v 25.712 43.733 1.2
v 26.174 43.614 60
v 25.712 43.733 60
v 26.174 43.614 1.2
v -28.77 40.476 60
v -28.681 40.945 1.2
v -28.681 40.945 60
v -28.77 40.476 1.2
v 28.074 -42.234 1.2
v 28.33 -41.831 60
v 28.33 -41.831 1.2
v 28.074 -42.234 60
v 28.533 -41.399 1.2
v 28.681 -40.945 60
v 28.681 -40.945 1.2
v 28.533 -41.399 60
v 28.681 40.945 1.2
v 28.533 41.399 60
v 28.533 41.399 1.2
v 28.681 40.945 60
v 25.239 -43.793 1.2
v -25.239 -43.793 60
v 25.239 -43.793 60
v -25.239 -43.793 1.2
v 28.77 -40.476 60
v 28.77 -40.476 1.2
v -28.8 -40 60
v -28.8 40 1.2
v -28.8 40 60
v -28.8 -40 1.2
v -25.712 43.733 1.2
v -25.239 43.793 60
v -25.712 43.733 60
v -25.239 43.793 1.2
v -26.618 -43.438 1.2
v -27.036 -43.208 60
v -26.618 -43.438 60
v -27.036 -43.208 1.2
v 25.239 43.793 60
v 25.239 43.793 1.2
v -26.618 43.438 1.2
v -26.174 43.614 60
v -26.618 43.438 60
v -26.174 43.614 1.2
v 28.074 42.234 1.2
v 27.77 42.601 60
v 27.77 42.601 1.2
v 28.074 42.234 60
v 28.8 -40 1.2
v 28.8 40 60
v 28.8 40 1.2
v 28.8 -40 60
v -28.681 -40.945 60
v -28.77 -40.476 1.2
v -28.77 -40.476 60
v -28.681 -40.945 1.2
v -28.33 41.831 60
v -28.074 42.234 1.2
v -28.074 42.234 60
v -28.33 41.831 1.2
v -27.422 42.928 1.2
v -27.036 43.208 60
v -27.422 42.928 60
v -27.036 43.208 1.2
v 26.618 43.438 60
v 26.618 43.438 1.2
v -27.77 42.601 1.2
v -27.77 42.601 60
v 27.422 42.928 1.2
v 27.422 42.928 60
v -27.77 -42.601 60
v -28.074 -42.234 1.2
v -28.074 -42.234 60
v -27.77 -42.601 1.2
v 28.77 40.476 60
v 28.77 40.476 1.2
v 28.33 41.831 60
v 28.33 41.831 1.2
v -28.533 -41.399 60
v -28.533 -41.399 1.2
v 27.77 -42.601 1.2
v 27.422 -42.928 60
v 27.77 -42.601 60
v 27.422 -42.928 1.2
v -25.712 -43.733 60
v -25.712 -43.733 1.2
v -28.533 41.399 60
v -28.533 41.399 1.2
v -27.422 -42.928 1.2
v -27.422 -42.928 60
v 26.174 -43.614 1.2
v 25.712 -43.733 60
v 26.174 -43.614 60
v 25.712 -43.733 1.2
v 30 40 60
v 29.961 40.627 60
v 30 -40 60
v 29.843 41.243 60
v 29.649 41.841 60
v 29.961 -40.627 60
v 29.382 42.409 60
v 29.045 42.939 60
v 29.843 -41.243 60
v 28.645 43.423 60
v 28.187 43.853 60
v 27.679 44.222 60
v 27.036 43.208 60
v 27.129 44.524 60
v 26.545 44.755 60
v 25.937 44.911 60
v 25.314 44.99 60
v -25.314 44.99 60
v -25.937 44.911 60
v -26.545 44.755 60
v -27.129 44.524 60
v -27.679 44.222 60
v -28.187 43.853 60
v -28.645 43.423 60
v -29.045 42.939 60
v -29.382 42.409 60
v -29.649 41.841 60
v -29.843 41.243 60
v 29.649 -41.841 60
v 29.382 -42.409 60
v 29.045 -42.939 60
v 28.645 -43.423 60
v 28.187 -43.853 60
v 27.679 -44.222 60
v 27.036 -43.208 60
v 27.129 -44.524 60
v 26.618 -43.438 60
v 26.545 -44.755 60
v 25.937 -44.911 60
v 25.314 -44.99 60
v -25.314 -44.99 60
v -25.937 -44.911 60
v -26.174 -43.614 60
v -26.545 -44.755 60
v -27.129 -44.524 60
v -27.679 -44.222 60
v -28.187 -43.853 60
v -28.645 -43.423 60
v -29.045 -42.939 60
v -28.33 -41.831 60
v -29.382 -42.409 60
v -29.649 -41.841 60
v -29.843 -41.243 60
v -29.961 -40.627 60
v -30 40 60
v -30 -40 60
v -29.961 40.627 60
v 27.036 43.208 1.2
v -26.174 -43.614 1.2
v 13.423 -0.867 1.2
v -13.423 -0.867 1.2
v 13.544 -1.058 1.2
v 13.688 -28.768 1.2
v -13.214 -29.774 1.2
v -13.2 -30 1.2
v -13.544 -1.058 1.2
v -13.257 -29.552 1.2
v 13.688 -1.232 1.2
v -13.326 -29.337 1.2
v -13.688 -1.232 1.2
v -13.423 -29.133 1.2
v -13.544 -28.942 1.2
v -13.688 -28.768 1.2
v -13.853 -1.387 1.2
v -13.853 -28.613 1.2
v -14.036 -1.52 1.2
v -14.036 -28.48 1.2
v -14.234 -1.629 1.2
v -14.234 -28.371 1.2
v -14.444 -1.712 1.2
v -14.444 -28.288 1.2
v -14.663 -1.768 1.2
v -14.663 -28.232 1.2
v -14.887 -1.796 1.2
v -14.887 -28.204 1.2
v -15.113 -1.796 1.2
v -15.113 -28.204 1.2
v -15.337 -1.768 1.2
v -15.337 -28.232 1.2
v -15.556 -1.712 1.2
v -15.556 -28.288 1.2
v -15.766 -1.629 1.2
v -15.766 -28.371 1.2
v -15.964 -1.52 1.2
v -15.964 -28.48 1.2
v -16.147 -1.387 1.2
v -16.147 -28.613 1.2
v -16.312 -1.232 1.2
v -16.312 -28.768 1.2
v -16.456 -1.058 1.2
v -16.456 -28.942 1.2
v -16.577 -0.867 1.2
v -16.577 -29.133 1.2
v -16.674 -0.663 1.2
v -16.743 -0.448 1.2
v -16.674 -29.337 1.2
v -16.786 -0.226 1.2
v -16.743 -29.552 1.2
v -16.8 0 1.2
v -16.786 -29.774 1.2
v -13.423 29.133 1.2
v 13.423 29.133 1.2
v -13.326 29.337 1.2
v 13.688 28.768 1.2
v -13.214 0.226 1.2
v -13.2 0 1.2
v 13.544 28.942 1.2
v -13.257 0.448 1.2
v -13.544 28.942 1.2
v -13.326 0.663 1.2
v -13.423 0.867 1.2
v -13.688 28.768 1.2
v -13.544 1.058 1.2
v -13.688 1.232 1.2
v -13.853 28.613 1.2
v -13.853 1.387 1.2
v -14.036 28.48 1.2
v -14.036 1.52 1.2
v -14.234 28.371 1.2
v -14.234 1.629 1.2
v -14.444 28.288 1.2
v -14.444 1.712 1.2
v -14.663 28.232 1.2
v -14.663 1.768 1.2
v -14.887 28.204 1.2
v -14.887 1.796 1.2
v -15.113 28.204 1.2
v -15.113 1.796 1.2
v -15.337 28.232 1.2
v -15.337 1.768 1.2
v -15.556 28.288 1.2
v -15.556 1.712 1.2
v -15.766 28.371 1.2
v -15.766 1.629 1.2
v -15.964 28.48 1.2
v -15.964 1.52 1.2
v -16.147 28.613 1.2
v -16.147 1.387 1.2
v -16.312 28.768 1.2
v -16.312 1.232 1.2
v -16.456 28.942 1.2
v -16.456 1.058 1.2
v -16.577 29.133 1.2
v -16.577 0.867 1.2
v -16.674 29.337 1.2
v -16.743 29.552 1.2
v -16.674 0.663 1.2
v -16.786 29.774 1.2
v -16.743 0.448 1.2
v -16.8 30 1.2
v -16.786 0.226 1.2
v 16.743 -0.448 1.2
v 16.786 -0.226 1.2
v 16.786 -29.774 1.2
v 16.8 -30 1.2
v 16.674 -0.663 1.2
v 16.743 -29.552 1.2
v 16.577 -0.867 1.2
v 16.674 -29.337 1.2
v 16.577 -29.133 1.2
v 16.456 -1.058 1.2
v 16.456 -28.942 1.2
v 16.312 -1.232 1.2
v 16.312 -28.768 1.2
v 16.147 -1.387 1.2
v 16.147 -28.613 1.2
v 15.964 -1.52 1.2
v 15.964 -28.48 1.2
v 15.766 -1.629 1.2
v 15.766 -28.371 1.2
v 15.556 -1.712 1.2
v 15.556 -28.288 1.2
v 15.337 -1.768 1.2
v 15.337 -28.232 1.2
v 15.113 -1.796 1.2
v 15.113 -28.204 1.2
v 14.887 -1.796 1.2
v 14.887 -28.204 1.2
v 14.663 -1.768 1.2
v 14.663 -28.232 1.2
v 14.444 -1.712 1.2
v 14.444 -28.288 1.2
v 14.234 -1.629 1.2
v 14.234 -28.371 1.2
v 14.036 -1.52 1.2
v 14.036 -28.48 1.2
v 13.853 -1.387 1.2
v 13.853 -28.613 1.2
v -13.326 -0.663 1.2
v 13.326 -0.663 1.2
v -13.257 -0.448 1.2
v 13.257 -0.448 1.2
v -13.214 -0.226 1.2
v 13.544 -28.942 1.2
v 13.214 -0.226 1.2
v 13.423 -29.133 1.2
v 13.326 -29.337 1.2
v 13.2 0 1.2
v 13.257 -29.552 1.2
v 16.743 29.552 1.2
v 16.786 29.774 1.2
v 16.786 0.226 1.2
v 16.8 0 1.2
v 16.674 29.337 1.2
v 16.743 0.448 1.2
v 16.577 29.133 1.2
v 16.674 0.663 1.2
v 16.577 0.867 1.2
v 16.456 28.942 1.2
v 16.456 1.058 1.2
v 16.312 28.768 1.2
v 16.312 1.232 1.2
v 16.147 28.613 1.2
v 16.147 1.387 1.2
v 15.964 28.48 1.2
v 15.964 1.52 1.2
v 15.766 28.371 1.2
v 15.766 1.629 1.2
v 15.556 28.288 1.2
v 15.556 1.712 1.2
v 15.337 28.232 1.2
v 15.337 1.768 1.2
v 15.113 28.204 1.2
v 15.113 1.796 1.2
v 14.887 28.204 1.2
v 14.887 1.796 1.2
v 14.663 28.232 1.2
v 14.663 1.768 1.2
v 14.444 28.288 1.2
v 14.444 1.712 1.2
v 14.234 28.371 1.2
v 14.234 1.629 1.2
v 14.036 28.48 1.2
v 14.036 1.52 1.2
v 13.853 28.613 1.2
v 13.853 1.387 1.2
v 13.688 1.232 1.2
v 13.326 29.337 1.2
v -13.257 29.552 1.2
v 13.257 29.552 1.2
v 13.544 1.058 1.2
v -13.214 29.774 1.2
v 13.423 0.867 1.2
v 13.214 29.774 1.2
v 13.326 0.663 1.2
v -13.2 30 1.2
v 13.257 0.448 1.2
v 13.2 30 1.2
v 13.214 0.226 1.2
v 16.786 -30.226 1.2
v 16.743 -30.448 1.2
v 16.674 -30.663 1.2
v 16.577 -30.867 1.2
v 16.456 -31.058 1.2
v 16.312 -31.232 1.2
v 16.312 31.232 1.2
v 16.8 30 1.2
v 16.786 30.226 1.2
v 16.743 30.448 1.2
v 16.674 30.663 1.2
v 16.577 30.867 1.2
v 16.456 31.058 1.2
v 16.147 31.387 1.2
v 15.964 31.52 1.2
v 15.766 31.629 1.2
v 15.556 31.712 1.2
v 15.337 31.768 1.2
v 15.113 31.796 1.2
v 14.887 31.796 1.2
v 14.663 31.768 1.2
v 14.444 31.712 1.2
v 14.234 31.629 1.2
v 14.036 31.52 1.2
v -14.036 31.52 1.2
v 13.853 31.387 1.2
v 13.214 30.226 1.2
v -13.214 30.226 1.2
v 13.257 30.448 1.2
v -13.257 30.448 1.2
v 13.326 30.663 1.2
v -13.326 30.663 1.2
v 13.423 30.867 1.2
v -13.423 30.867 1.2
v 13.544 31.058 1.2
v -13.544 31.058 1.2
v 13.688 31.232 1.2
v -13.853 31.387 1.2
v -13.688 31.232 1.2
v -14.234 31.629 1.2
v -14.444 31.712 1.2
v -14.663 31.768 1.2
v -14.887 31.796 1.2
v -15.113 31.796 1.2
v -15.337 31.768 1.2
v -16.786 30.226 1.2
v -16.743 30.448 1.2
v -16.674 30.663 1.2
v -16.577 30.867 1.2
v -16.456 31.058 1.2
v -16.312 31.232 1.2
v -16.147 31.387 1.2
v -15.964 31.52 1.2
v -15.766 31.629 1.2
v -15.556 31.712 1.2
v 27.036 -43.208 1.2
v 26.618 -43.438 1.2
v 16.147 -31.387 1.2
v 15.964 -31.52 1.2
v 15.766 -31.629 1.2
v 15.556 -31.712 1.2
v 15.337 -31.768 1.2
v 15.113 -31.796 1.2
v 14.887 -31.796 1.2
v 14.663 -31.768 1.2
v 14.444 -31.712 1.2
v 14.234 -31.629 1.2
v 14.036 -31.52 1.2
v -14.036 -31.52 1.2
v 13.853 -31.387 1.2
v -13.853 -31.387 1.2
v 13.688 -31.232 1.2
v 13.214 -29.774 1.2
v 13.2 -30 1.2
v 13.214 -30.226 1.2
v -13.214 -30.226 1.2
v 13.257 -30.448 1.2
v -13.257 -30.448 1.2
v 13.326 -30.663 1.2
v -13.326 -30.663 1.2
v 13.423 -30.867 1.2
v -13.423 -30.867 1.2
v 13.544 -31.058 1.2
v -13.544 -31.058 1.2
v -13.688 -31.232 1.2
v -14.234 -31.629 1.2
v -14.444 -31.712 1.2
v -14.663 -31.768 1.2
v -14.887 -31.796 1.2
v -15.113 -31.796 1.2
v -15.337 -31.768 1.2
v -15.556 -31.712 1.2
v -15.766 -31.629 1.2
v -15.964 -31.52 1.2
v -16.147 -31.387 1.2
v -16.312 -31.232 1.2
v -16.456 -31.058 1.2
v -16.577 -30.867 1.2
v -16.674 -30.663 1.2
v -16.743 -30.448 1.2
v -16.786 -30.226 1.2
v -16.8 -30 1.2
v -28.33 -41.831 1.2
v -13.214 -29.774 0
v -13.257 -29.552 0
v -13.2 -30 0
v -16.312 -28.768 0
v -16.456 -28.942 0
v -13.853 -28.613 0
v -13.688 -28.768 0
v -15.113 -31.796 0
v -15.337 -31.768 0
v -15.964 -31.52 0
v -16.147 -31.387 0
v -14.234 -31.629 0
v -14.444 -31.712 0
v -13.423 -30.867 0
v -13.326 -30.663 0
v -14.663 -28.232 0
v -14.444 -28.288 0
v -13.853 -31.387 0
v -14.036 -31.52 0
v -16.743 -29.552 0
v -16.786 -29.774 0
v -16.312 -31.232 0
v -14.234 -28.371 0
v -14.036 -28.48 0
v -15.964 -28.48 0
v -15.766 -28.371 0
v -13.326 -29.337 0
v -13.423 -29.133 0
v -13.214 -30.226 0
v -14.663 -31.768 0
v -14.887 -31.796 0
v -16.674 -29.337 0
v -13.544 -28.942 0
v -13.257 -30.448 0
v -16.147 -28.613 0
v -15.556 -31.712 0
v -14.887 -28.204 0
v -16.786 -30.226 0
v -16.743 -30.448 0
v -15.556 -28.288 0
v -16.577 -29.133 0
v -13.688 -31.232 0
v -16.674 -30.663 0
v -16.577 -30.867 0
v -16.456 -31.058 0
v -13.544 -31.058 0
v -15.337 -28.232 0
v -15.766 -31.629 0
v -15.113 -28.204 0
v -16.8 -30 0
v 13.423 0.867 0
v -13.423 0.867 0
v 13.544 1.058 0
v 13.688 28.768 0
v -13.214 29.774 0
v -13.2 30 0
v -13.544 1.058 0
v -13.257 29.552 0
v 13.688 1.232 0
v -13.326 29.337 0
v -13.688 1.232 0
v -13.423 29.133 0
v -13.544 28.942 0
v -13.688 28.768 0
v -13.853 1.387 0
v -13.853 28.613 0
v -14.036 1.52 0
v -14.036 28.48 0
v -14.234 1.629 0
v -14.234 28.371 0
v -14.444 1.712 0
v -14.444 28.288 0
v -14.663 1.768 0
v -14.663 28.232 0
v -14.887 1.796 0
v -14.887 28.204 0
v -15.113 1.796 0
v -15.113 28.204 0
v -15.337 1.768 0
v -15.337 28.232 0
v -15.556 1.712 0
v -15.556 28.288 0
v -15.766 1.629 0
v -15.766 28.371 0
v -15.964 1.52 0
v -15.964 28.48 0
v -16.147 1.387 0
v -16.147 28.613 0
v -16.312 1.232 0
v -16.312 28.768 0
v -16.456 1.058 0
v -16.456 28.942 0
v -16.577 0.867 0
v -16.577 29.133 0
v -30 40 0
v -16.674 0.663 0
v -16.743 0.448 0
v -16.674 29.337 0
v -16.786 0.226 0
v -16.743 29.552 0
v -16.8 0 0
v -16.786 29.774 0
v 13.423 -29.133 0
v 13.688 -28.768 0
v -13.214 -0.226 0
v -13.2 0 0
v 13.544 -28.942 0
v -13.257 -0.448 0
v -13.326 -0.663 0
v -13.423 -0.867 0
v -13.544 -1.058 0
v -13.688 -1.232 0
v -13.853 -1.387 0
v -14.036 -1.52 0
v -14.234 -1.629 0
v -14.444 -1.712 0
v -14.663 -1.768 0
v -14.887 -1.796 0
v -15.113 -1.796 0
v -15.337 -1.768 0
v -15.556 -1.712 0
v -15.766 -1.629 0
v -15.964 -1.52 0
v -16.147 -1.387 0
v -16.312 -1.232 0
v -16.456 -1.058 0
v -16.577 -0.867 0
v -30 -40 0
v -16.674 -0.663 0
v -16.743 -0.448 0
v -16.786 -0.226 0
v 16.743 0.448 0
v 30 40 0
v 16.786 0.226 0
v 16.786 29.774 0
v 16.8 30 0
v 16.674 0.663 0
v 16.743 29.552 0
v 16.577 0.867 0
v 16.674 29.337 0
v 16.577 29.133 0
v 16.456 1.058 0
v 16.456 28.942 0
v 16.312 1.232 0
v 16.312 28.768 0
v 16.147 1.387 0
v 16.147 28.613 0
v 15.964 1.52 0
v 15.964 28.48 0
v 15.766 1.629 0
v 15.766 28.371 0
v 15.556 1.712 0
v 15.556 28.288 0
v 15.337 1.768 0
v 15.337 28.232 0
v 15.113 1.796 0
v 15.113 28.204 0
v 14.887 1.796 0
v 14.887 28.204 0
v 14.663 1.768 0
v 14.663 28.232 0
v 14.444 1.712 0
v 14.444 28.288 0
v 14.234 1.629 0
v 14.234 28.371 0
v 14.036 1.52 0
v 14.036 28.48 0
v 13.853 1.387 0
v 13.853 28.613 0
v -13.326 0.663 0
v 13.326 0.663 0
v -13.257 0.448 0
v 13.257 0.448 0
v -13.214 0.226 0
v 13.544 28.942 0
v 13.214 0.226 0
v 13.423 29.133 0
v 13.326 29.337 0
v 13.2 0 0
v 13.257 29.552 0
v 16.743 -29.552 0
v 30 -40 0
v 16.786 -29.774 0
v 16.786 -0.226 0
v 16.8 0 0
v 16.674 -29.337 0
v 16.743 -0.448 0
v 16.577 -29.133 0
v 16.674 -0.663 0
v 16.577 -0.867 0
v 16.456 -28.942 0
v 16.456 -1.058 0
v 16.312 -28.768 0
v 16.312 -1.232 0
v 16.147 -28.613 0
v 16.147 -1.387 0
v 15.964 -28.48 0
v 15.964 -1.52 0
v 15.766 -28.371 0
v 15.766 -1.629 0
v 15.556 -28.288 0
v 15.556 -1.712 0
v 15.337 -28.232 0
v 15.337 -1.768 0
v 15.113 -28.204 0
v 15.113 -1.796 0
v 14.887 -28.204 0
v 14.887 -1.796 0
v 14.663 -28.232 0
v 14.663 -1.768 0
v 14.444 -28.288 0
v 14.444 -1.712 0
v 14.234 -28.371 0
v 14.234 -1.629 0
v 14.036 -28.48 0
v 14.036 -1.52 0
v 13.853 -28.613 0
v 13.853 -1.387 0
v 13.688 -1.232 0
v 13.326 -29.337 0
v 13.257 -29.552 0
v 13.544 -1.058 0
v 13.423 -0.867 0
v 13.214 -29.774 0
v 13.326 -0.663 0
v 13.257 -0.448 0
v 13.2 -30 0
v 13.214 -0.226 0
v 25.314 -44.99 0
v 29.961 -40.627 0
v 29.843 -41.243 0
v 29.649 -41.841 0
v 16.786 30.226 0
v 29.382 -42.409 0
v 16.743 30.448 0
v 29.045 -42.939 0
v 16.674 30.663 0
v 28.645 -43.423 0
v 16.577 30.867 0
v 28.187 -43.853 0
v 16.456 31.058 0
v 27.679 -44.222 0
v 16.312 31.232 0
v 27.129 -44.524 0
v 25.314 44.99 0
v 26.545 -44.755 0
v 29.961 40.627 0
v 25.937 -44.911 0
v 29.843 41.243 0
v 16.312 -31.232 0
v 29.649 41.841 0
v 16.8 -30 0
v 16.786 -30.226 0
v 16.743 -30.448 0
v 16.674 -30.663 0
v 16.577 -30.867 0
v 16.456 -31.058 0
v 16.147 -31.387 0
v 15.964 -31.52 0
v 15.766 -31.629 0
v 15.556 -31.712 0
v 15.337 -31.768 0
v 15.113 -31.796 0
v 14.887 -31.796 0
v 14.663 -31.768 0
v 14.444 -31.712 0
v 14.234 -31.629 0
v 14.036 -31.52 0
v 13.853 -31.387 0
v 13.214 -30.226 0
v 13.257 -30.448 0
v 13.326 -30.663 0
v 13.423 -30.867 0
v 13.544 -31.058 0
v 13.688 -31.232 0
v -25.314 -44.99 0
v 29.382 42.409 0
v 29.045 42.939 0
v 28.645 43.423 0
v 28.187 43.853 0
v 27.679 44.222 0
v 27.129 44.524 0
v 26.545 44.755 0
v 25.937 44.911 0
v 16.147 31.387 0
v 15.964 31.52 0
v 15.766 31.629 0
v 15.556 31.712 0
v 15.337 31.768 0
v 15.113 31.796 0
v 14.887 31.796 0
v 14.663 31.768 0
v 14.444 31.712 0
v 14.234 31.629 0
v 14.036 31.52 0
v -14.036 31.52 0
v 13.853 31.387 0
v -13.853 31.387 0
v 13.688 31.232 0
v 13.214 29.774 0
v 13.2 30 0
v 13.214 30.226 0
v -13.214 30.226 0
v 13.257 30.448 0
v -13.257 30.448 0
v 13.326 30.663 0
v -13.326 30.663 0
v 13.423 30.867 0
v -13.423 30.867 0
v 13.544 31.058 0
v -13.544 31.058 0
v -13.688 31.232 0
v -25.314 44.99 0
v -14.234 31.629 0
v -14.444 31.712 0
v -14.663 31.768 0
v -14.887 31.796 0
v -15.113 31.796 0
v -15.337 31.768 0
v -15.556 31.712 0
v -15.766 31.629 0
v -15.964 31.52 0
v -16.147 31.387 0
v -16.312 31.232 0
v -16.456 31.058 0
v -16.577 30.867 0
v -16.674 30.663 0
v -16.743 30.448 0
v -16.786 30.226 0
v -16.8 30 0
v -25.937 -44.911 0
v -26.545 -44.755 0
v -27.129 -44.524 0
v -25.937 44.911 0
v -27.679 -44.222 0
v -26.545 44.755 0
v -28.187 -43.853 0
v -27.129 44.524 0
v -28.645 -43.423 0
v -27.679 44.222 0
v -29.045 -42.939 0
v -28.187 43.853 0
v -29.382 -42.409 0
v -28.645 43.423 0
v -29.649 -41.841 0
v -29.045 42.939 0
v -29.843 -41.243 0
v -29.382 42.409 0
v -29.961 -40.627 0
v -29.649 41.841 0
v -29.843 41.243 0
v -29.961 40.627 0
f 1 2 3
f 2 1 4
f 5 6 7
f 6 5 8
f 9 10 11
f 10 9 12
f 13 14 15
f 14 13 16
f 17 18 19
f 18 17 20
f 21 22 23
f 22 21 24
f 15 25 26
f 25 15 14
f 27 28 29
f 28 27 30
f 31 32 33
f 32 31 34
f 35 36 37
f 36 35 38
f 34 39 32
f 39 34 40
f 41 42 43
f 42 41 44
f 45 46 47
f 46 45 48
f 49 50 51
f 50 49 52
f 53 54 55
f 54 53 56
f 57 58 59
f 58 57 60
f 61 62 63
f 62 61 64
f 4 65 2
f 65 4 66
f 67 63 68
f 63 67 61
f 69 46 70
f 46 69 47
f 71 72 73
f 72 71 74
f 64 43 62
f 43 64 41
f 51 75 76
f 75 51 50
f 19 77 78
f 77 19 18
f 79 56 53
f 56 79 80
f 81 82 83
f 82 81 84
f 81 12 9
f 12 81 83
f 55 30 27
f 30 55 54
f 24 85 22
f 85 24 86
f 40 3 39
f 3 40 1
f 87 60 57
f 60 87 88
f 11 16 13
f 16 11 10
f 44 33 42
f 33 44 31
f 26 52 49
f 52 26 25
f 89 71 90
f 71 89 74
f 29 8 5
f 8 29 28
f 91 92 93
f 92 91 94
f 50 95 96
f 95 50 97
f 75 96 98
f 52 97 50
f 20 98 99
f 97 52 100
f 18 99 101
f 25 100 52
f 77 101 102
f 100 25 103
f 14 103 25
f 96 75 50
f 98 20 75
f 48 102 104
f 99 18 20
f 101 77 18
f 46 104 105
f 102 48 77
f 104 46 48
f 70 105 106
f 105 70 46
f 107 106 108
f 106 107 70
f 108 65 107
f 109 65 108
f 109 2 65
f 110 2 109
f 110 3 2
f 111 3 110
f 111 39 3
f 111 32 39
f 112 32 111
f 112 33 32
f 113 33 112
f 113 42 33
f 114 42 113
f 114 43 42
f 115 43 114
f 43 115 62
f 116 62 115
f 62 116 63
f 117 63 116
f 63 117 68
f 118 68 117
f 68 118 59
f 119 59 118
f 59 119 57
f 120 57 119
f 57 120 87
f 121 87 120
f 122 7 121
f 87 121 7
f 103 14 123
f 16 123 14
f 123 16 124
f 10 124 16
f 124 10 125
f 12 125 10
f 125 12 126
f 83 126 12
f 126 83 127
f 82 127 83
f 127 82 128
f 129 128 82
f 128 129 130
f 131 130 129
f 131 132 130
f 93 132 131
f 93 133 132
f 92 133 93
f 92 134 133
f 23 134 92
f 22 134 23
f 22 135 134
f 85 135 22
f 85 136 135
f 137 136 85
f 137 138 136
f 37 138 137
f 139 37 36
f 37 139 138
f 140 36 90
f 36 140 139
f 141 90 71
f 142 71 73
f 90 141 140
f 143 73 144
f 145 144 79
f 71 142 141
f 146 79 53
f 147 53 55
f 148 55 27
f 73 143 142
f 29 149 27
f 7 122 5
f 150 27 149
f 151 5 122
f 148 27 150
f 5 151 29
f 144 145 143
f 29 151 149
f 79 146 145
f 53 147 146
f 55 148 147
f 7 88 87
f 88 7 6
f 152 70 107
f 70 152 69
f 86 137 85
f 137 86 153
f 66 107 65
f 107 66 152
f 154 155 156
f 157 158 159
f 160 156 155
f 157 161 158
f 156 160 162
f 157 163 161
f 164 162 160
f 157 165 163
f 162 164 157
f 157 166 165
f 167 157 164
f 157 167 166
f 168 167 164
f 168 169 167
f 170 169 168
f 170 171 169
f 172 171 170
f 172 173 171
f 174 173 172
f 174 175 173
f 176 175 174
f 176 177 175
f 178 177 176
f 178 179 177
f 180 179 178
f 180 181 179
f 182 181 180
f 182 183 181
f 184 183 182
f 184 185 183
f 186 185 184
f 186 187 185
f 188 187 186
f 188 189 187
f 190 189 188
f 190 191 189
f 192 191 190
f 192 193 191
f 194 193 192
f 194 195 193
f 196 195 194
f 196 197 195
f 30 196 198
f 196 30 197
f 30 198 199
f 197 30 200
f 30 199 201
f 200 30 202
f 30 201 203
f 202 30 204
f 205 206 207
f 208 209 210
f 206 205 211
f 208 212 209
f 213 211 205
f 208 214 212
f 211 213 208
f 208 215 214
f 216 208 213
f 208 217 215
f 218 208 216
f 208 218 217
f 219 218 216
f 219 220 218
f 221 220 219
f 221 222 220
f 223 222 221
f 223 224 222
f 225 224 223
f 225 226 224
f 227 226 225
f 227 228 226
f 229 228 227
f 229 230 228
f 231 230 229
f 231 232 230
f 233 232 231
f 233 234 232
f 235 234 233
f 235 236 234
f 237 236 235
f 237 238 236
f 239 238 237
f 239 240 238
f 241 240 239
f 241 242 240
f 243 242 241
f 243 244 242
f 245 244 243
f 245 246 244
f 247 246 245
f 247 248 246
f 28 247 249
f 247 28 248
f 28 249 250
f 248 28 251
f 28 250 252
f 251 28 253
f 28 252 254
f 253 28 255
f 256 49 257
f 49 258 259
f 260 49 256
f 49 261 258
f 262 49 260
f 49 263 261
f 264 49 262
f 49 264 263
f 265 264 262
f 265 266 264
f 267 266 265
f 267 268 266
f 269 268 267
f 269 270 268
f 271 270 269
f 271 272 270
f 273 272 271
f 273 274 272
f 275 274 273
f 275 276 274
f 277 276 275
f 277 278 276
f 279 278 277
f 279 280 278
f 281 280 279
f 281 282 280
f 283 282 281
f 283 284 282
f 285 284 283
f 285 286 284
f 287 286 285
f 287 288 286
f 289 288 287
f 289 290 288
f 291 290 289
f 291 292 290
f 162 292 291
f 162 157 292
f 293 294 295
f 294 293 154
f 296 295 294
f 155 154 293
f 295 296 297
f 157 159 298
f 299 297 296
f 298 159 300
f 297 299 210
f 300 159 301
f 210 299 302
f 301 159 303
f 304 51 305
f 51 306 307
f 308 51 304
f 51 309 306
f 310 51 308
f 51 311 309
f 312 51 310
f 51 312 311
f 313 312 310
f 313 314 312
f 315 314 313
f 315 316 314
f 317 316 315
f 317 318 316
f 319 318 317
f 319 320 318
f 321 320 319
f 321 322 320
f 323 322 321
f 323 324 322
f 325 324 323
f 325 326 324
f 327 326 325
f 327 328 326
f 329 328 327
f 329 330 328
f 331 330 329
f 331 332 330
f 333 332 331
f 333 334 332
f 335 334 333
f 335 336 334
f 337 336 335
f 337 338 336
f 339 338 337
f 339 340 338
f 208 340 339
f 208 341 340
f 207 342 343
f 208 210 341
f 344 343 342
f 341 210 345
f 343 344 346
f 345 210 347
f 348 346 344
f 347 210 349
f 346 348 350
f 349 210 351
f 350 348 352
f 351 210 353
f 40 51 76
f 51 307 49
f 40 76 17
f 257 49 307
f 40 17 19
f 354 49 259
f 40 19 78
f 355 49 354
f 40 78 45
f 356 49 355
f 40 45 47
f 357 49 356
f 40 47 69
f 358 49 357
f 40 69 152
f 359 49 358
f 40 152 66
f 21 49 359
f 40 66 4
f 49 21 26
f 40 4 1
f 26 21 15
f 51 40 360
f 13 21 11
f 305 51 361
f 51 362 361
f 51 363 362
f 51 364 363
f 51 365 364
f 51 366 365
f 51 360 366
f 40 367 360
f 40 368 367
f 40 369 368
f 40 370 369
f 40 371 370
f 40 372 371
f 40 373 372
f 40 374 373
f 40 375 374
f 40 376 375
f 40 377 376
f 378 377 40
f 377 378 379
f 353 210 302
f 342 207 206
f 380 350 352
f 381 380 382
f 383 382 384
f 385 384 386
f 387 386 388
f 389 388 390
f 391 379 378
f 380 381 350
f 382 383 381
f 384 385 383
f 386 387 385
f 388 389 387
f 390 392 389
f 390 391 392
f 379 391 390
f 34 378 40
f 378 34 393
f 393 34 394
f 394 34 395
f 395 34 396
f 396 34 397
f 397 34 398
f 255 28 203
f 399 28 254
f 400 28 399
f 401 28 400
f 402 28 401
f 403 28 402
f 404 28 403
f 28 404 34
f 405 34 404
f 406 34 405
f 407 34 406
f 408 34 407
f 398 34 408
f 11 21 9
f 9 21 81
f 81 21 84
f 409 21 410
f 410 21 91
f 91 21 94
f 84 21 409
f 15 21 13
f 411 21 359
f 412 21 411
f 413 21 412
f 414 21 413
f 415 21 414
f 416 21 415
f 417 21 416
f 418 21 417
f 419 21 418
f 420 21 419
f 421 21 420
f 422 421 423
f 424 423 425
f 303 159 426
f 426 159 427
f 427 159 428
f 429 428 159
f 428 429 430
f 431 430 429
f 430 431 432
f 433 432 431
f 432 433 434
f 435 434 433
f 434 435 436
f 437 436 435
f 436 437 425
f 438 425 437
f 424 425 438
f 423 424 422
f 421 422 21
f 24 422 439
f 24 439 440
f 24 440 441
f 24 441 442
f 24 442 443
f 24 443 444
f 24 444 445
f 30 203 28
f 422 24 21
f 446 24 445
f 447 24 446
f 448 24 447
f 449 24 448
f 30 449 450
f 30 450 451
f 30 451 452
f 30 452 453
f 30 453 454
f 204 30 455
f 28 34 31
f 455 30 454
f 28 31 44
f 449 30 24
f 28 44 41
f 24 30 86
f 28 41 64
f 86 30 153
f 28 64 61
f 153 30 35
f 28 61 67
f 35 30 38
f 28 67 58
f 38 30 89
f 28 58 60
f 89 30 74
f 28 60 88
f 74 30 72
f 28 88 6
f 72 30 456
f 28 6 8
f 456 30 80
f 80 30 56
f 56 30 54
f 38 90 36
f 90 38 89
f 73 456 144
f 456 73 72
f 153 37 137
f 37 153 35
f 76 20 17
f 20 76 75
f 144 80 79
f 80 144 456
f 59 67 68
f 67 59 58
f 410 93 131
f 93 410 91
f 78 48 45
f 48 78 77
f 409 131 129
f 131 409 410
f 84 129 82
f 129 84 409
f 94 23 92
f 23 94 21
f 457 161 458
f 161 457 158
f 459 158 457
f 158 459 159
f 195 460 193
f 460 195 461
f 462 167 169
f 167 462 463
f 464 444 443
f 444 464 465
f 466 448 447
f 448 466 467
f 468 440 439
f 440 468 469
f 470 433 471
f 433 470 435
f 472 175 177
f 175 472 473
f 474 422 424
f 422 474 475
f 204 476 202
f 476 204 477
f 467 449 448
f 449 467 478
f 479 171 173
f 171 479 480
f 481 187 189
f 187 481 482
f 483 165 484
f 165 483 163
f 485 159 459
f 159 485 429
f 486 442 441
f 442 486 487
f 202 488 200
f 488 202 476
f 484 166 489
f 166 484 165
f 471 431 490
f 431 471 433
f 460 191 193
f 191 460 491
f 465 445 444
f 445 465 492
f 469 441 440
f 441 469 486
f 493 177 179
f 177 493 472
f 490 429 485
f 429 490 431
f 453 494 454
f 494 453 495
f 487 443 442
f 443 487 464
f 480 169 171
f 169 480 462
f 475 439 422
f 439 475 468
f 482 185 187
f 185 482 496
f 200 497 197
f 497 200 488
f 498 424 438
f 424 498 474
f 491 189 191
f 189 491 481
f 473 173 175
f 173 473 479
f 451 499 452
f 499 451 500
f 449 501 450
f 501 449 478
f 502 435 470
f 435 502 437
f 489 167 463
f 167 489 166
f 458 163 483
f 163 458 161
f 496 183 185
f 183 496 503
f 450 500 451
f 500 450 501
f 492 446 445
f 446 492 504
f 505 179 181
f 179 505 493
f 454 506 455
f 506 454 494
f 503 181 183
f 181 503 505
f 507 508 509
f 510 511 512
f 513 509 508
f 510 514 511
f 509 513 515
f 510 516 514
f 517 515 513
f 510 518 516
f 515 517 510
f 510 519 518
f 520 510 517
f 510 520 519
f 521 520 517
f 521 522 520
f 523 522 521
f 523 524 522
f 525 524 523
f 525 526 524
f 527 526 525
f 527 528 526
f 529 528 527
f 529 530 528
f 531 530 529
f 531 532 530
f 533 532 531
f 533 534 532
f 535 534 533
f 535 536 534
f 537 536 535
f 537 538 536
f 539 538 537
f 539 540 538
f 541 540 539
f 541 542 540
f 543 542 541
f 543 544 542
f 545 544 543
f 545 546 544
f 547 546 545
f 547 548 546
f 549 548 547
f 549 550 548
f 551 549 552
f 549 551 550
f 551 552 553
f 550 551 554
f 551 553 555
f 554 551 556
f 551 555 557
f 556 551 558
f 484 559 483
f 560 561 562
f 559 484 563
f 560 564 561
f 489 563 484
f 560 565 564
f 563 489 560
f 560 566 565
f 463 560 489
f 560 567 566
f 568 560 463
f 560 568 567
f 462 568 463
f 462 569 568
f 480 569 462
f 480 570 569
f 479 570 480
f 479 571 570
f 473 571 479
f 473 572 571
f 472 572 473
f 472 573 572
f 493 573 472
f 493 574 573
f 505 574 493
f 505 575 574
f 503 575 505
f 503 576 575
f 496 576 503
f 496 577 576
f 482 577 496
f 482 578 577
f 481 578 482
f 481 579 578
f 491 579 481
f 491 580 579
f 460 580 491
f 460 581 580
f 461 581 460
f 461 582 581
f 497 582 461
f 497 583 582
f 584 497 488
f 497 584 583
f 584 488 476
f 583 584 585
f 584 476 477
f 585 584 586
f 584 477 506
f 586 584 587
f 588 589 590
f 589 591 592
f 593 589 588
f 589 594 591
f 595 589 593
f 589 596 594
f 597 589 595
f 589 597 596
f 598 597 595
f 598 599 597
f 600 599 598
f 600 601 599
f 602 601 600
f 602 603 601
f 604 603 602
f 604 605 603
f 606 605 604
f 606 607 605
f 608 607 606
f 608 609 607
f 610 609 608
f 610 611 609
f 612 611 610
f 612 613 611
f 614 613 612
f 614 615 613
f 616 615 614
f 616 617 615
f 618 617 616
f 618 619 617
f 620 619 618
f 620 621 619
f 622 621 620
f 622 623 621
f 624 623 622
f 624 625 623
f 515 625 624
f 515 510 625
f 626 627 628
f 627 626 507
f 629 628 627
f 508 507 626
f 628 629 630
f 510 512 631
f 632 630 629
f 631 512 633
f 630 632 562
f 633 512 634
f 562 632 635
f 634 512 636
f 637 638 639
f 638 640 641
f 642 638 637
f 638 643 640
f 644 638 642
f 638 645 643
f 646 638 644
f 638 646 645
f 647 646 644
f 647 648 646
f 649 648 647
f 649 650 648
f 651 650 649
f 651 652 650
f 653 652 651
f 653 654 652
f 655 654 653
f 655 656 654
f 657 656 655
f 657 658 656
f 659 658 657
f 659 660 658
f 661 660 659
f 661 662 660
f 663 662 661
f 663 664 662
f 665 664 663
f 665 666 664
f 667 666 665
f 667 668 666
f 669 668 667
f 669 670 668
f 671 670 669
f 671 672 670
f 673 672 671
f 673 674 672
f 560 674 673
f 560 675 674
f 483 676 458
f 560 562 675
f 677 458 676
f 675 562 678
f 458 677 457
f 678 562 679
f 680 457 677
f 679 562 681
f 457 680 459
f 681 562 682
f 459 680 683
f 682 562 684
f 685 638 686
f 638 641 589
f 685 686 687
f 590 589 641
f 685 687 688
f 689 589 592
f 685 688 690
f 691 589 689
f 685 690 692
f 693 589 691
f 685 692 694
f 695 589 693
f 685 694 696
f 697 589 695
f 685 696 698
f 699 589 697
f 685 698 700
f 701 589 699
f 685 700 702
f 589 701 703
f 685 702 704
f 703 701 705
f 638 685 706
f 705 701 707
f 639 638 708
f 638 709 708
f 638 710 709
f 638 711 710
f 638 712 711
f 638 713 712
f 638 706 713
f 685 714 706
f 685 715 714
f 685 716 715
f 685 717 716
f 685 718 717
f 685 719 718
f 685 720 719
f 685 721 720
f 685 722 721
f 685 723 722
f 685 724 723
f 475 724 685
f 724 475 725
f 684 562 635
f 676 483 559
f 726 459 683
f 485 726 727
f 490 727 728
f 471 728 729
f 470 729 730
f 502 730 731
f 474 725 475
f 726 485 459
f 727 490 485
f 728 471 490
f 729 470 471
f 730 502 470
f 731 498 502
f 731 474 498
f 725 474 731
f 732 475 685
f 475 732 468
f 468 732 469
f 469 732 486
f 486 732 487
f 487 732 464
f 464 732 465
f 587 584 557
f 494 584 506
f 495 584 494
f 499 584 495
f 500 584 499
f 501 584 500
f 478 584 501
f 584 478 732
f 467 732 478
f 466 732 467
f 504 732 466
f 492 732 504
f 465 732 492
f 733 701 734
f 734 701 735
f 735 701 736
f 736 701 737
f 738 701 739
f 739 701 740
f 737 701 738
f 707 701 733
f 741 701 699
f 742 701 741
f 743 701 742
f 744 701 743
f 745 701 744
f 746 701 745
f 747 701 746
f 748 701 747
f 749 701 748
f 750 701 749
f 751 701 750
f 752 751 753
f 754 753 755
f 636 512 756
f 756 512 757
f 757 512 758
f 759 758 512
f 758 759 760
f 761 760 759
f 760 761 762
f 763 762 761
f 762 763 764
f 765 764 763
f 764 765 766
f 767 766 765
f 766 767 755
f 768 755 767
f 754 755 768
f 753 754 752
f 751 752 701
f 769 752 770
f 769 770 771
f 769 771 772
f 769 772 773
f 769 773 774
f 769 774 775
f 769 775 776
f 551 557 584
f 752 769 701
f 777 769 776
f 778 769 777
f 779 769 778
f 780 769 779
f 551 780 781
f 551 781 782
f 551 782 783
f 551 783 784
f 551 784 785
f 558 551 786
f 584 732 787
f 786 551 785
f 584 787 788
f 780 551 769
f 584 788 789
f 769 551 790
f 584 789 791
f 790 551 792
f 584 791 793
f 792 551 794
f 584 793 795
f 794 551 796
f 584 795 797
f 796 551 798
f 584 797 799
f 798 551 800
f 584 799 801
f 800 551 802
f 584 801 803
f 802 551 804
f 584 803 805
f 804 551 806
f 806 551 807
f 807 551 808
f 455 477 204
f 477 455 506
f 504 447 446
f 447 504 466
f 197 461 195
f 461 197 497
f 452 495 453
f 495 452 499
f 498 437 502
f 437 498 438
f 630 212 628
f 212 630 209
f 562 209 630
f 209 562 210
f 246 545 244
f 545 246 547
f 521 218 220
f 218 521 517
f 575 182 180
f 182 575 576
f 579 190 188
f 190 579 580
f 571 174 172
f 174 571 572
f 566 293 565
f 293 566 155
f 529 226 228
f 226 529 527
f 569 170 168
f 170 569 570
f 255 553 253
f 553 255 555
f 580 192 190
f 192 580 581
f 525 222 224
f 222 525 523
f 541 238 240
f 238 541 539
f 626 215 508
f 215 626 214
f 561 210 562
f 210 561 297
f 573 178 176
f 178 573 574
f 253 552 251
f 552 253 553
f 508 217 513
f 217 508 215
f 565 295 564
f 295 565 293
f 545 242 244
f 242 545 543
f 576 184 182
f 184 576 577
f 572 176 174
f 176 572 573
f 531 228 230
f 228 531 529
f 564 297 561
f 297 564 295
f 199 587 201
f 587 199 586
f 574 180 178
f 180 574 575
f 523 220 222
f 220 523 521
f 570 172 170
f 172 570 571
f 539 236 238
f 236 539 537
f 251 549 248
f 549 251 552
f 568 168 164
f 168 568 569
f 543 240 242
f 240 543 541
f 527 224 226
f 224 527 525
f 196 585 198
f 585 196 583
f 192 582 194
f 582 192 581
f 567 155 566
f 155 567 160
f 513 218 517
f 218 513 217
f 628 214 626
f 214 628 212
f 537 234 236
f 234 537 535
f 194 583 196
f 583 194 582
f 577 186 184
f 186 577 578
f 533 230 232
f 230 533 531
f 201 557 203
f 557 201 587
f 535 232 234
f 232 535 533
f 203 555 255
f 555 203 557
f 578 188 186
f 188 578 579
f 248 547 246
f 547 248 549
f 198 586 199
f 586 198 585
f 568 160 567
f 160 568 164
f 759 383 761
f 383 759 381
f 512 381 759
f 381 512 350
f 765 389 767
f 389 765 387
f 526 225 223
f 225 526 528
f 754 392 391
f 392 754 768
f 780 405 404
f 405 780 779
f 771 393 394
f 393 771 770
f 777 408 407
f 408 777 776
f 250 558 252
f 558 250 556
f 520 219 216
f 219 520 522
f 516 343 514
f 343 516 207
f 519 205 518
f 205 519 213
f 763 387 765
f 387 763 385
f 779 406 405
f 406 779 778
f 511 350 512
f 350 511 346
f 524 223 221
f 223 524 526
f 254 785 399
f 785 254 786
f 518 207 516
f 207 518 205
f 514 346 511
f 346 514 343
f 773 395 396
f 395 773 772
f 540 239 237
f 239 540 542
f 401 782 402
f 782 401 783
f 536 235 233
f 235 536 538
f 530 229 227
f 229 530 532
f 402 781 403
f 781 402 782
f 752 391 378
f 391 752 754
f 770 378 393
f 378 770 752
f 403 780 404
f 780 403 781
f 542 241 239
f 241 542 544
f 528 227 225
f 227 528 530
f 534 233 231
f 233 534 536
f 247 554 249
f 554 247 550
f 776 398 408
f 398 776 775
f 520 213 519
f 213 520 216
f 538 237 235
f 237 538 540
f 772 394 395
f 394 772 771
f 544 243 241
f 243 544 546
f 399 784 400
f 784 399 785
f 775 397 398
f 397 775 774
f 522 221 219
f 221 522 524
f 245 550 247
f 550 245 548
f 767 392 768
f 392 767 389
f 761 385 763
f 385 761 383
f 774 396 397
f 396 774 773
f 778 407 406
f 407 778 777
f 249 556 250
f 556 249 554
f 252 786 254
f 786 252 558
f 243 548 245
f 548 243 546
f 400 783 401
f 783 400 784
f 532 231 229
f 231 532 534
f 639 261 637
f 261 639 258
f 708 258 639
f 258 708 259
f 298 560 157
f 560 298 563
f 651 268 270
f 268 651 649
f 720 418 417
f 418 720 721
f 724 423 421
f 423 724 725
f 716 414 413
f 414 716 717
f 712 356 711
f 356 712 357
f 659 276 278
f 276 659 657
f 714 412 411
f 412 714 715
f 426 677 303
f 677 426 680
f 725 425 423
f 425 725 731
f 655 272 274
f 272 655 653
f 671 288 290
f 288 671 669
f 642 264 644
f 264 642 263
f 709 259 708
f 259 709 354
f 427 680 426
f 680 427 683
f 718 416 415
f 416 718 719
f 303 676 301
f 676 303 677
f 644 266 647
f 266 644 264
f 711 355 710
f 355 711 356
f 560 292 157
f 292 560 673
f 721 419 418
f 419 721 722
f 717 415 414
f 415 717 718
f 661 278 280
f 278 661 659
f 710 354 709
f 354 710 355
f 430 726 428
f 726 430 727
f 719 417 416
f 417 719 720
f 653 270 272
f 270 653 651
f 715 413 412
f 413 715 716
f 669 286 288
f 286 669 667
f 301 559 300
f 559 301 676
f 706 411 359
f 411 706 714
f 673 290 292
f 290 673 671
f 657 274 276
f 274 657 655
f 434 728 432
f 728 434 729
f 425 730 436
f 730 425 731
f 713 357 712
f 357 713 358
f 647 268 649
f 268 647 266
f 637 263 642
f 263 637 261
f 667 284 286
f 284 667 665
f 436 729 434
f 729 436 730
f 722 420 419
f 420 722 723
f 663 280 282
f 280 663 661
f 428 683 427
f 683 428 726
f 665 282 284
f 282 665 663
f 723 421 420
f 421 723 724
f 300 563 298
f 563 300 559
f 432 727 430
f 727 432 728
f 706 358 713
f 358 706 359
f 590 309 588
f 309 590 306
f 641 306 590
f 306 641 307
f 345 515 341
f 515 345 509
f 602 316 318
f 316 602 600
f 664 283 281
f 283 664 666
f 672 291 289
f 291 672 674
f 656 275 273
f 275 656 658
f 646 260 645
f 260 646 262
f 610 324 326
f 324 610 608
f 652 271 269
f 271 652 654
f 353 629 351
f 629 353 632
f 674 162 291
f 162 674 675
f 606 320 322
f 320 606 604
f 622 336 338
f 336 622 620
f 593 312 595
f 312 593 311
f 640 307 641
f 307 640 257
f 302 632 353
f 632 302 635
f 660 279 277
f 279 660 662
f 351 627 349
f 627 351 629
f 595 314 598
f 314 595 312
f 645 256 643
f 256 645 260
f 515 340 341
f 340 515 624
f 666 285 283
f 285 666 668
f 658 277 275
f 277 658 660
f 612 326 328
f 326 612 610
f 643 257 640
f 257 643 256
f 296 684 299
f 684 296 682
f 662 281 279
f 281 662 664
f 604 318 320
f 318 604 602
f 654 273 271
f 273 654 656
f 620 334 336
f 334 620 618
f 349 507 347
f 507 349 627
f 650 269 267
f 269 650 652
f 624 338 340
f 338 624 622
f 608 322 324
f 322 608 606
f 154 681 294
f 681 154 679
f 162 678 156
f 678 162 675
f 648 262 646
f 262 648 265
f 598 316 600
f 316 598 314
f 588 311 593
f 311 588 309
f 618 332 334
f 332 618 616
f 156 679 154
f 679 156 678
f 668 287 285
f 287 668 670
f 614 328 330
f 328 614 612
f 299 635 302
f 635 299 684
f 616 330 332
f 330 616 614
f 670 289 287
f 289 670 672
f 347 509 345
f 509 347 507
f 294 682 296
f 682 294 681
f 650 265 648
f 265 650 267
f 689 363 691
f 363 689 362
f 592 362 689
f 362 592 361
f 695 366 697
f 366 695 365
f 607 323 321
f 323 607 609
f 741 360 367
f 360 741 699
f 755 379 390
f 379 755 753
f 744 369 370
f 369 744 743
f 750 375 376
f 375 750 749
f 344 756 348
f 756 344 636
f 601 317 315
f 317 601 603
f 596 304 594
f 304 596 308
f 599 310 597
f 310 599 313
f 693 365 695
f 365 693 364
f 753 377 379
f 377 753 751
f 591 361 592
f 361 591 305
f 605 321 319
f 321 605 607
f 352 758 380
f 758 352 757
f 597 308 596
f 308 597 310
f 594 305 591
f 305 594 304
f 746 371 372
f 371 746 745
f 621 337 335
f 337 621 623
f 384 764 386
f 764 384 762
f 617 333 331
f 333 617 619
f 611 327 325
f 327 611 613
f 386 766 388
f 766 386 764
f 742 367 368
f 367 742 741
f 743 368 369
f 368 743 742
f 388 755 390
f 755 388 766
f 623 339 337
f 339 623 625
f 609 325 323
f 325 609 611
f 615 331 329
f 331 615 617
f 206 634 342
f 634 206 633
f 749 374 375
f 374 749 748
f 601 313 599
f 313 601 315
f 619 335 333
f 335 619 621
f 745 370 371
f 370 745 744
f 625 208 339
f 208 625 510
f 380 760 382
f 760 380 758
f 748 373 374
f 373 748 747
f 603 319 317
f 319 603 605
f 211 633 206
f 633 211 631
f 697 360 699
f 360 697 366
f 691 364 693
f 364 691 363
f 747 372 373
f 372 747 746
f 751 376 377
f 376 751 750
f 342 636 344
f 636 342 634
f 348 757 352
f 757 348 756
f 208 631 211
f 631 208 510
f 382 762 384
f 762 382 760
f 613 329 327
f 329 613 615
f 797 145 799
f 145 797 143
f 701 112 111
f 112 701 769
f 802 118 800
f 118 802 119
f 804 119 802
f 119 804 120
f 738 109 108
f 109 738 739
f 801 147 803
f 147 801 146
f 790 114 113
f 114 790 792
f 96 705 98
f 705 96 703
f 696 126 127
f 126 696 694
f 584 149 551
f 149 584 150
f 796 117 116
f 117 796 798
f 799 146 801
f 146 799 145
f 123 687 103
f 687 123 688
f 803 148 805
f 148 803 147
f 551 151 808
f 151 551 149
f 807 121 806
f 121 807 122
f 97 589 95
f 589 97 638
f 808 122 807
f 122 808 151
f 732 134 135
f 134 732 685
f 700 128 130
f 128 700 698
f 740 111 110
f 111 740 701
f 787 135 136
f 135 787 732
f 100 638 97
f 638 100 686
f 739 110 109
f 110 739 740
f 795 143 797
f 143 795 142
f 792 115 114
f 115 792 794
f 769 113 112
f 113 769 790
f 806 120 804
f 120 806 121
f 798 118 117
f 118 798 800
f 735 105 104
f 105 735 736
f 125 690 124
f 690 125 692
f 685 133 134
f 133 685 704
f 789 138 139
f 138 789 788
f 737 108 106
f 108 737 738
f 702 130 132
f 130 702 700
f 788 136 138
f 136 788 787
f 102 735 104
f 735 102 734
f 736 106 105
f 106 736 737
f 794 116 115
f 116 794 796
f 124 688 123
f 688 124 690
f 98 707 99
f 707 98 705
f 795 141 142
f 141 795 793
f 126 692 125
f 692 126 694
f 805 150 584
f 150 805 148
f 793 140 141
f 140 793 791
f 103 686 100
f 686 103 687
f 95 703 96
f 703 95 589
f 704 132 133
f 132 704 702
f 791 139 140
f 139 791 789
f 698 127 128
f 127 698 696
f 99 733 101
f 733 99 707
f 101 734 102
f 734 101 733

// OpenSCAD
$fn = 50;


difference() {
	union() {
		hull() {
			translate(v = [-25.0000000000, 40.0000000000, 0]) {
				cylinder(h = 60, r = 5);
			}
			translate(v = [25.0000000000, 40.0000000000, 0]) {
				cylinder(h = 60, r = 5);
			}
			translate(v = [-25.0000000000, -40.0000000000, 0]) {
				cylinder(h = 60, r = 5);
			}
			translate(v = [25.0000000000, -40.0000000000, 0]) {
				cylinder(h = 60, r = 5);
			}
		}
	}
	union() {
		translate(v = [0, 0, 1.2000000000]) {
			hull() {
				translate(v = [-25.0000000000, 40.0000000000, 0]) {
					cylinder(h = 58.8000000000, r = 3.8000000000);
				}
				translate(v = [25.0000000000, 40.0000000000, 0]) {
					cylinder(h = 58.8000000000, r = 3.8000000000);
				}
				translate(v = [-25.0000000000, -40.0000000000, 0]) {
					cylinder(h = 58.8000000000, r = 3.8000000000);
				}
				translate(v = [25.0000000000, -40.0000000000, 0]) {
					cylinder(h = 58.8000000000, r = 3.8000000000);
				}
			}
		}
		#translate(v = [-15.0000000000, -30.0000000000, 0]) {
			cylinder(h = 1.2000000000, r = 1.8000000000);
		}
		#translate(v = [-15.0000000000, 0.0000000000, 0]) {
			cylinder(h = 1.2000000000, r = 1.8000000000);
		}
		#translate(v = [-15.0000000000, 30.0000000000, 0]) {
			cylinder(h = 1.2000000000, r = 1.8000000000);
		}
		#translate(v = [15.0000000000, -30.0000000000, 0]) {
			cylinder(h = 1.2000000000, r = 1.8000000000);
		}
		#translate(v = [15.0000000000, 0.0000000000, 0]) {
			cylinder(h = 1.2000000000, r = 1.8000000000);
		}
		#translate(v = [15.0000000000, 30.0000000000, 0]) {
			cylinder(h = 1.2000000000, r = 1.8000000000);
		}
	}
}
